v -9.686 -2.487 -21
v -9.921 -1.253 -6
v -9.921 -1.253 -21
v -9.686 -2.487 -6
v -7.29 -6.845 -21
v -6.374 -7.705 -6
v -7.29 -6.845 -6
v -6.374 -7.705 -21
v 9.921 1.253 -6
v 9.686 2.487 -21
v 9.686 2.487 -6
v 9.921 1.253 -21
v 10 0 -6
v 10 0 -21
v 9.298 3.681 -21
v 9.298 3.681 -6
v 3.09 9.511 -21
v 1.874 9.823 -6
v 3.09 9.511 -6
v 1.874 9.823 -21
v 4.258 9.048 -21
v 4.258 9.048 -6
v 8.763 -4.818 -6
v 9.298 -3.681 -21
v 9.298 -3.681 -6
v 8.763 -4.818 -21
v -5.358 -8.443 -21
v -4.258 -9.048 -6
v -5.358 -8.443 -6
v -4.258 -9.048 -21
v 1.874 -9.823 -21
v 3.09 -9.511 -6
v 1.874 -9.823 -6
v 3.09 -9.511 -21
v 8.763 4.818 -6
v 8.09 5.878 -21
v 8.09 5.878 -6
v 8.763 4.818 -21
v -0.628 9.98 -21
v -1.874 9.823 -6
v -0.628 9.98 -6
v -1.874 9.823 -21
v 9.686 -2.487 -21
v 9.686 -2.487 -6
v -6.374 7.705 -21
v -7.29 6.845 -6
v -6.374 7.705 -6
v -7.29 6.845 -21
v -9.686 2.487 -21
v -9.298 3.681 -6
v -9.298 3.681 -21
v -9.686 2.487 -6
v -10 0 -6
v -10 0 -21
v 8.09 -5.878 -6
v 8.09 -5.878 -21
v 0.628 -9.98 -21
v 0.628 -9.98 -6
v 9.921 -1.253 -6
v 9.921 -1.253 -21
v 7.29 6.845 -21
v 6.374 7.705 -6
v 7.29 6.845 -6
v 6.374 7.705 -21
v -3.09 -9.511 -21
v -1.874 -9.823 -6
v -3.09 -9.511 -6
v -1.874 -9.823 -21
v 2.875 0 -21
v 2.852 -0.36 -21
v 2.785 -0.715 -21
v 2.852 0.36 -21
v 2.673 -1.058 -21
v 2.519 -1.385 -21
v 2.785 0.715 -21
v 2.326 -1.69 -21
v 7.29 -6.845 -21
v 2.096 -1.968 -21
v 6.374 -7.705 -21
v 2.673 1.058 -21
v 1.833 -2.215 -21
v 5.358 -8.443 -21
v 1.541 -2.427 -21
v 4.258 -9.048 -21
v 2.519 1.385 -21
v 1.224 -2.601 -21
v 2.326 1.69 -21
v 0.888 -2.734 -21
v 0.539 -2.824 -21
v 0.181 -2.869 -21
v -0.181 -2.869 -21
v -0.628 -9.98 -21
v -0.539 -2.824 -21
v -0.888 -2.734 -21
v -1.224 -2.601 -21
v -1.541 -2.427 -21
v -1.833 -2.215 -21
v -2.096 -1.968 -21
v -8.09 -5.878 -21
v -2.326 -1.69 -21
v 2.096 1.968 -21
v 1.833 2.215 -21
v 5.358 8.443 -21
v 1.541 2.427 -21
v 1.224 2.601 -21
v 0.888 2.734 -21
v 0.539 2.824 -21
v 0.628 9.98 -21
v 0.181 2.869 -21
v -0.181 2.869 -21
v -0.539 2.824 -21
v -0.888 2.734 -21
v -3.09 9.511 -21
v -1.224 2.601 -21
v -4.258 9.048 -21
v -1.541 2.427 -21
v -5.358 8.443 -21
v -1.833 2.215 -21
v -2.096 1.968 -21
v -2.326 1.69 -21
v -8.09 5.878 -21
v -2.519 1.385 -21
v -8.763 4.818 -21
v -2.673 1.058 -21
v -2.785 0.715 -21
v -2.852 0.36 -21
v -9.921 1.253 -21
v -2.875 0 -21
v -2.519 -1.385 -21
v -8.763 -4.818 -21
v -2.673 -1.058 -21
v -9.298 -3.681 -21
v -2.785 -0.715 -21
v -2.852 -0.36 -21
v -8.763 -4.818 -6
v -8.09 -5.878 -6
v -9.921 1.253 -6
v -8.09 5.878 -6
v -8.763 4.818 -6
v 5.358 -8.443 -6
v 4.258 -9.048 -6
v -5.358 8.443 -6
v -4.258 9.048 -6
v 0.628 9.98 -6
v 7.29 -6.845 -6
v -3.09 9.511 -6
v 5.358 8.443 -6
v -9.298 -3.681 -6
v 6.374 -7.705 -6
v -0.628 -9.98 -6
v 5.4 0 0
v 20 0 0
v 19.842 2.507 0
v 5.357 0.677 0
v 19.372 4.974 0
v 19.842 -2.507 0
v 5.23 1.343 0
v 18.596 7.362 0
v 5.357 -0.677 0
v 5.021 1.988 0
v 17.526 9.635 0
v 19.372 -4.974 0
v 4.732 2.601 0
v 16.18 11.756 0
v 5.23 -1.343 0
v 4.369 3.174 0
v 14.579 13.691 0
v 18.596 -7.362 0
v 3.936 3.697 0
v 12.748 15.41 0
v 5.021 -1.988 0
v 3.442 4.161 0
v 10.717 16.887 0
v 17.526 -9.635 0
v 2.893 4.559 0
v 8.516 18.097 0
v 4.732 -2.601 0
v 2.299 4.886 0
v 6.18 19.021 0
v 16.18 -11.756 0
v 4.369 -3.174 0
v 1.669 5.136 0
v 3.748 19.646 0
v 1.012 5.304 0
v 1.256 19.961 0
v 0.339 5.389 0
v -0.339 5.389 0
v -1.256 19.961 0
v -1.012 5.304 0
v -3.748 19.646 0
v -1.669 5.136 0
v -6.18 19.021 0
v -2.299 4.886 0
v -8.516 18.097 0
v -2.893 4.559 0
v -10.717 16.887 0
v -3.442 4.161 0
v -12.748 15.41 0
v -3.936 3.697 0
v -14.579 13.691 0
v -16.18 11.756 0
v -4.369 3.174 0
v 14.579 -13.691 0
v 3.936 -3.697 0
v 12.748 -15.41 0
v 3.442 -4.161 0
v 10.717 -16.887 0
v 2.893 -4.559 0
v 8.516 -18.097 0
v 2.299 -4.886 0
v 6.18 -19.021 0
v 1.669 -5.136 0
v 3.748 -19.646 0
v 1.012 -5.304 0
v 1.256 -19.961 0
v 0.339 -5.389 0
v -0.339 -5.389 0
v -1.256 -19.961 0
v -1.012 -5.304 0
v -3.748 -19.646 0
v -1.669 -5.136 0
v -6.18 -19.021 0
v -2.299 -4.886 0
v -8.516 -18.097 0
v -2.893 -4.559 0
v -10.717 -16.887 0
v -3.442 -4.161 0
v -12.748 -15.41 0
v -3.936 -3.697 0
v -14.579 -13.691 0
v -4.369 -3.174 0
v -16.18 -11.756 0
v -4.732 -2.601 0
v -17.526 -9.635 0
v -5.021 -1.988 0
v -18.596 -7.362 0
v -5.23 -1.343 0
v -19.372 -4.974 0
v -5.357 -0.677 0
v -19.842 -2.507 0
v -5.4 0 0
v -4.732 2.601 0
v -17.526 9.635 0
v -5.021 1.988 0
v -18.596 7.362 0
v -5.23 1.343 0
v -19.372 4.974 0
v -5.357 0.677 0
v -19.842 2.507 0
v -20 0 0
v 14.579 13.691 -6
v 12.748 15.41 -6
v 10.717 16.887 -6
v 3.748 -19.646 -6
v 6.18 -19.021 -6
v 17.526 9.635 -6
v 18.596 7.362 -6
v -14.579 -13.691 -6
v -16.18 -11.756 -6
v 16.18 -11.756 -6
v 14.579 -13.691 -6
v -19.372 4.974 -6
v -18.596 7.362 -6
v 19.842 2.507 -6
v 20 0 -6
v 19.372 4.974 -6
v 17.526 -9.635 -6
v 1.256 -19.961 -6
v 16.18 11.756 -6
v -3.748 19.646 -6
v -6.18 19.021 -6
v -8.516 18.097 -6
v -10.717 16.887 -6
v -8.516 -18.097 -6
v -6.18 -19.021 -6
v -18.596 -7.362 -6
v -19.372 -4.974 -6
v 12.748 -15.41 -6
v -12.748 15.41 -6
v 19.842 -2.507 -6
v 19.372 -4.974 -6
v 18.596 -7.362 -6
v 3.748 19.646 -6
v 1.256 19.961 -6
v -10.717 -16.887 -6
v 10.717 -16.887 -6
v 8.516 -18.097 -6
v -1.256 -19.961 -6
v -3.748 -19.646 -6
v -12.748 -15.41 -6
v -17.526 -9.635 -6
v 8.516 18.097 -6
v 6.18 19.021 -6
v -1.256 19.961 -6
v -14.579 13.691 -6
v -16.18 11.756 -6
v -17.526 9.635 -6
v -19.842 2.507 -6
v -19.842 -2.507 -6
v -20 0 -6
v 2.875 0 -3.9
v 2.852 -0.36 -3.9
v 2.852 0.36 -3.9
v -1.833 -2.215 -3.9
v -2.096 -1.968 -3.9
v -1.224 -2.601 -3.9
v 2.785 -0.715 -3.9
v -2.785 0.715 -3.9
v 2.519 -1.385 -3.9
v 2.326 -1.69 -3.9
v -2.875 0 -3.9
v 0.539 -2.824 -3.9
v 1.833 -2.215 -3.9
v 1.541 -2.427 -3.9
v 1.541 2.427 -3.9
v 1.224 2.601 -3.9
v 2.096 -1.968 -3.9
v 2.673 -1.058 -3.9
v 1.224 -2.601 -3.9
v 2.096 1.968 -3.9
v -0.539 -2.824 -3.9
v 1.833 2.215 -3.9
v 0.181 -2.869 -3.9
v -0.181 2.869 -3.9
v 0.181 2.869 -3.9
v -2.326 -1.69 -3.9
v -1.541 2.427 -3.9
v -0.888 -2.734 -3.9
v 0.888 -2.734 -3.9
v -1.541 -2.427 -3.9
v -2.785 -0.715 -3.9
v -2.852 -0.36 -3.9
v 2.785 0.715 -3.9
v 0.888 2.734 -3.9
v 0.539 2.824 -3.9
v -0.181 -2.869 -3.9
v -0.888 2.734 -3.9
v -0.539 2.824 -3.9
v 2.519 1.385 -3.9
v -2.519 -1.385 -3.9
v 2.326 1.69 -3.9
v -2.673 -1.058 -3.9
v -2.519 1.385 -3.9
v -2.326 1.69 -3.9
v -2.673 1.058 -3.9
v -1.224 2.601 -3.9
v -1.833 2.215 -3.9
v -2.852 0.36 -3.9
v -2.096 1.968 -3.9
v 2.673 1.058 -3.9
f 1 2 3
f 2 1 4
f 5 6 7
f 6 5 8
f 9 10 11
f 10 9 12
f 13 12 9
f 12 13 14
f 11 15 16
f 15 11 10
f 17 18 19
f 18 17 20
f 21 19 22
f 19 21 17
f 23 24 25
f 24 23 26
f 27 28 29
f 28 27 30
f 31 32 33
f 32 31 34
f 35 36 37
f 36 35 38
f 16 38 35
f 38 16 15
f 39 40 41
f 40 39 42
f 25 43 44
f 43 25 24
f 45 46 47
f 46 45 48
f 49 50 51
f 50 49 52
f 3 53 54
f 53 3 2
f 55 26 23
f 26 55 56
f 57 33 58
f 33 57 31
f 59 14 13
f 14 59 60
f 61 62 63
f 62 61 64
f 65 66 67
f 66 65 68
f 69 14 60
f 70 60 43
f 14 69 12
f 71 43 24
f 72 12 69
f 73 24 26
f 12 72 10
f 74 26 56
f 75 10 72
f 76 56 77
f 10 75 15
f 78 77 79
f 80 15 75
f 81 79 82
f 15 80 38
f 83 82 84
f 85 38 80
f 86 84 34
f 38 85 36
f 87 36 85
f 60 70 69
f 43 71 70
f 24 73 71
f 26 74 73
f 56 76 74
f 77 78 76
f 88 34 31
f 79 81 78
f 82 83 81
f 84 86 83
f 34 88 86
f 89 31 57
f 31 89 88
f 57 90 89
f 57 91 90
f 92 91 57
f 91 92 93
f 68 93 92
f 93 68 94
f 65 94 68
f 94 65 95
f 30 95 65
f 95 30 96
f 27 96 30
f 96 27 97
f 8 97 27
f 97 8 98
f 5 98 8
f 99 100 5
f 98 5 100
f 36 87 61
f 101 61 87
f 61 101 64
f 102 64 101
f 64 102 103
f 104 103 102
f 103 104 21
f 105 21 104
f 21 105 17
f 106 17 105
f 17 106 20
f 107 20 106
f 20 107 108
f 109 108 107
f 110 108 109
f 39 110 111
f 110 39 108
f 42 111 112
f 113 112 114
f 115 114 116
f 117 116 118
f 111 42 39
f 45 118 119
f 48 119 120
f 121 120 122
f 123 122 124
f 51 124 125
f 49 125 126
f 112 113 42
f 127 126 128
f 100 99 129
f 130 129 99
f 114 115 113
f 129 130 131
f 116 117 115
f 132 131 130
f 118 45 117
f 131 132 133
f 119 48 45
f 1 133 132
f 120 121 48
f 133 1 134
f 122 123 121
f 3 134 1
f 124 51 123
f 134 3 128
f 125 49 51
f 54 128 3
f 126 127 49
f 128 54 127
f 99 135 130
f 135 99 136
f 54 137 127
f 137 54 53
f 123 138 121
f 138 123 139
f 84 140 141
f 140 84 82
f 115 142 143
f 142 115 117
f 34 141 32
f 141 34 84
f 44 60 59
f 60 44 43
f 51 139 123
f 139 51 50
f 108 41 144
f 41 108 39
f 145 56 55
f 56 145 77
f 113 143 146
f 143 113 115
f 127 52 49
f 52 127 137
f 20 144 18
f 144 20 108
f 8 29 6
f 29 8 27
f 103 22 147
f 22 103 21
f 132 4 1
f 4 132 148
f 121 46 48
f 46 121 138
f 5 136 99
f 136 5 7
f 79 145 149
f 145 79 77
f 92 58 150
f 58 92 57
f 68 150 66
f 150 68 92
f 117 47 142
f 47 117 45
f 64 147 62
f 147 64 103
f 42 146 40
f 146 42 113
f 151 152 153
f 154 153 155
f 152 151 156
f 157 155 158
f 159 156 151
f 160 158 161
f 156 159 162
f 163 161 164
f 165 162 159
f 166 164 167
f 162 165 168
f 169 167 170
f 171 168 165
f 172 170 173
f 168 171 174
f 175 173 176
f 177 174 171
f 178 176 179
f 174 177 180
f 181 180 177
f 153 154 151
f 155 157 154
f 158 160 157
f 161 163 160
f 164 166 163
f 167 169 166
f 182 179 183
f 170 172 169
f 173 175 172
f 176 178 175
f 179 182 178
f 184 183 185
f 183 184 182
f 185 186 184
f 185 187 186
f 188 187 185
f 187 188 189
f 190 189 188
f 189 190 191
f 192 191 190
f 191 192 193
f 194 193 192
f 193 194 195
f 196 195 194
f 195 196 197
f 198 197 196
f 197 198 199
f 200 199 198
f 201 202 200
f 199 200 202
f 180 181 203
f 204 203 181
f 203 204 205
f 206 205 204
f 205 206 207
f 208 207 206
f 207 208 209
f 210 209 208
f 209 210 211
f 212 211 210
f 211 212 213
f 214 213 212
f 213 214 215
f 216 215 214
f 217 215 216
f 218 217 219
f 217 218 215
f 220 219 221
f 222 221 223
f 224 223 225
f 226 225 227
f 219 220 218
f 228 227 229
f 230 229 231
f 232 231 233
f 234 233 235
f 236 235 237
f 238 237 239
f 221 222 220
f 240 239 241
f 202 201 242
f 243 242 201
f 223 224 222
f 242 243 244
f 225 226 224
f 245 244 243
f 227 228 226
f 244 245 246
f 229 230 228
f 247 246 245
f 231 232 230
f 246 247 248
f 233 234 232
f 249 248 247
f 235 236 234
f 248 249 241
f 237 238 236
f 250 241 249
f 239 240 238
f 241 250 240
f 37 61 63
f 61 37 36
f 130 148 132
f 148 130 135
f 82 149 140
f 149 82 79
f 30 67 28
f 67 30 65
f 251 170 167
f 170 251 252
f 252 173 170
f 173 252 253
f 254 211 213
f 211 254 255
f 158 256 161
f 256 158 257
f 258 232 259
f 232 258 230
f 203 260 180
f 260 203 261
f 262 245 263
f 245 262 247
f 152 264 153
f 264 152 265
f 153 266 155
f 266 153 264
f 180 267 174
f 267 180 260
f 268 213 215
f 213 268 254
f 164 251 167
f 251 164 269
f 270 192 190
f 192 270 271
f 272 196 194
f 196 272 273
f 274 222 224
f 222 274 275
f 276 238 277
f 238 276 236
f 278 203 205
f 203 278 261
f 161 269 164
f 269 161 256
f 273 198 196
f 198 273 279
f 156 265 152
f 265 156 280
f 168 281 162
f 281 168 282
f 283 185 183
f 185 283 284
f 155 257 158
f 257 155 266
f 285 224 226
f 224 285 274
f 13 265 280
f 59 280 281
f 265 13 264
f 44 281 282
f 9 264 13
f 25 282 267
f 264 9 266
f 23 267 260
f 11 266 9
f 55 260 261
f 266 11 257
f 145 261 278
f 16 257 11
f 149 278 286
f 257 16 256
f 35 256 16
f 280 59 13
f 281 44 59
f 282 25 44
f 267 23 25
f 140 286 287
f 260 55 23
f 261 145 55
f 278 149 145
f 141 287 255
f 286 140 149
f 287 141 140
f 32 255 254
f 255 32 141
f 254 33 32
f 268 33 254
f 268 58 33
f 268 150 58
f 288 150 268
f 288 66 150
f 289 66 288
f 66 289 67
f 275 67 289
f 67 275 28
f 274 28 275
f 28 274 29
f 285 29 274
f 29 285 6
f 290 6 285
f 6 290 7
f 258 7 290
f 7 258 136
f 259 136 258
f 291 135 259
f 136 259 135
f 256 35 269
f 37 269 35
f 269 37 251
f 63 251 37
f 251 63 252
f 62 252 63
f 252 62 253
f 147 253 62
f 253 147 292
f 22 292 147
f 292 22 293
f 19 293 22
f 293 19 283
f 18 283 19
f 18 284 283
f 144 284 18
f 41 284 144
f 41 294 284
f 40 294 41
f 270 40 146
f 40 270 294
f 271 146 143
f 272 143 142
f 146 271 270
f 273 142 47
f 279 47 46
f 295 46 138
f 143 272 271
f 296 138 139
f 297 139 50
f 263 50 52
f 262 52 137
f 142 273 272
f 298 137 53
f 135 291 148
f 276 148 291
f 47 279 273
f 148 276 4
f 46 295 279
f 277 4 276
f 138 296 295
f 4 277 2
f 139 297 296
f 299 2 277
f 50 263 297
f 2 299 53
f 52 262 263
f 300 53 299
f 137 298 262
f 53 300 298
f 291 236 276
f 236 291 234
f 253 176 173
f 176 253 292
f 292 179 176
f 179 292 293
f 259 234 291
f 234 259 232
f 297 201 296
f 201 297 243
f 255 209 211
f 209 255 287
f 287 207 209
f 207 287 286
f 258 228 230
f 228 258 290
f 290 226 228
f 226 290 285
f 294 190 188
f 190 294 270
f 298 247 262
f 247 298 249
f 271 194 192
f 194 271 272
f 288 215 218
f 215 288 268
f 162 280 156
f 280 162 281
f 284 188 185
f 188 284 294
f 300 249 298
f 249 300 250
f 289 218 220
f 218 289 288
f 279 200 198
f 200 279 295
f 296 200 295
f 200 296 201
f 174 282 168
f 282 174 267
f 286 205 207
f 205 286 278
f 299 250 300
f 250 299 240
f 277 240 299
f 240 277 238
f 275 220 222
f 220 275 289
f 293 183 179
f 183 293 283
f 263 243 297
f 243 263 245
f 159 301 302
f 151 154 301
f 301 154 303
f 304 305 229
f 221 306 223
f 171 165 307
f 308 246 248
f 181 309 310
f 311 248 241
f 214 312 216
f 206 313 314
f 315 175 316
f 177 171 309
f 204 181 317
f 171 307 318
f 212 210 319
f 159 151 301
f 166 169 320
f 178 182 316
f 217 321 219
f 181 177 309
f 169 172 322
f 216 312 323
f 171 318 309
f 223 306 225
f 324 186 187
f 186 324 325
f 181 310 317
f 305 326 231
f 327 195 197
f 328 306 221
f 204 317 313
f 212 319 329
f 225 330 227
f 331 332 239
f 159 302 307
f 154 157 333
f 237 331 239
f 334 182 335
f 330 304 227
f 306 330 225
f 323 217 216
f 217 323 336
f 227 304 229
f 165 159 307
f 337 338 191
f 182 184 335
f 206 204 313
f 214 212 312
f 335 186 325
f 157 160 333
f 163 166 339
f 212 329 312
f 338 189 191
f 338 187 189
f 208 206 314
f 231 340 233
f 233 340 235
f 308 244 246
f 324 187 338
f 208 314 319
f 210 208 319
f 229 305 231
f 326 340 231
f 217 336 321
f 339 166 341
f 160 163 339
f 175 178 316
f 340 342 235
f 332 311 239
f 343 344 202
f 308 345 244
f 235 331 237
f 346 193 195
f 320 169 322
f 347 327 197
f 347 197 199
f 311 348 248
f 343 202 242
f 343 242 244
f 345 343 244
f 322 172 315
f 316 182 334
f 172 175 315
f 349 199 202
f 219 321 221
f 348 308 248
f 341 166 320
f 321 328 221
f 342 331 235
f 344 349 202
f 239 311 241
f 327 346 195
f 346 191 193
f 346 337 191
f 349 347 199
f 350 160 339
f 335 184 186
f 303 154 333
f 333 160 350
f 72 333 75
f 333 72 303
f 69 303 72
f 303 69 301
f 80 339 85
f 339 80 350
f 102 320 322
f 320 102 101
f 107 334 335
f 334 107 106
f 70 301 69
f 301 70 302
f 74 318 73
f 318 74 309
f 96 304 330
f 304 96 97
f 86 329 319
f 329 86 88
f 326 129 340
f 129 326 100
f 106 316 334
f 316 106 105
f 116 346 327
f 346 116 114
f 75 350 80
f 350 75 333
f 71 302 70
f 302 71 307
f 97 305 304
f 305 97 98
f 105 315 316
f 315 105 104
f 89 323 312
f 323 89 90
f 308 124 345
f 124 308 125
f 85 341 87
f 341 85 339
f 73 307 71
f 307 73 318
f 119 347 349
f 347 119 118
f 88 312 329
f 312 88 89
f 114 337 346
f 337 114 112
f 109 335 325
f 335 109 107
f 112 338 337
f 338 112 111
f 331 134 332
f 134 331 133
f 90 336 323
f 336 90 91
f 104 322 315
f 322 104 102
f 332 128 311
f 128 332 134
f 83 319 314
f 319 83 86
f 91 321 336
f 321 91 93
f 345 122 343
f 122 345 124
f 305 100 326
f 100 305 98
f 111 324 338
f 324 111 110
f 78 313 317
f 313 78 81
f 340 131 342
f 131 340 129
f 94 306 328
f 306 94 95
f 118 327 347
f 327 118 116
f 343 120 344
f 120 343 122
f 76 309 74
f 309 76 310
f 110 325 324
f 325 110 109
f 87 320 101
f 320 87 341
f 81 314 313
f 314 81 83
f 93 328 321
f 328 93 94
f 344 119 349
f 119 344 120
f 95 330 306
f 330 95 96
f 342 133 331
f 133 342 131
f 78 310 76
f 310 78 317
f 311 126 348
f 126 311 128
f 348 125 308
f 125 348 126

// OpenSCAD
$fn = 50;


difference() {
	union() {
		translate(v = [0, 0, -21.0000000000]) {
			cylinder(h = 21, r = 10.0000000000);
		}
		translate(v = [0, 0, -6.0000000000]) {
			cylinder(h = 6, r = 20.0000000000);
		}
	}
	union() {
		translate(v = [0, 0, 0]) {
			rotate(a = [0, 0, 0]) {
				difference() {
					union() {
						#translate(v = [0, 0, -21.0000000000]) {
							cylinder(h = 21, r = 2.6000000000);
						}
						#translate(v = [0, 0, -3.9000000000]) {
							cylinder(h = 3.9000000000, r1 = 2.8750000000, r2 = 5.4000000000);
						}
						#translate(v = [0, 0, -21.0000000000]) {
							cylinder(h = 21, r = 2.8750000000);
						}
						#translate(v = [0, 0, -21.0000000000]) {
							cylinder(h = 21, r = 2.6000000000);
						}
					}
					union();
				}
			}
		}
	}
}
